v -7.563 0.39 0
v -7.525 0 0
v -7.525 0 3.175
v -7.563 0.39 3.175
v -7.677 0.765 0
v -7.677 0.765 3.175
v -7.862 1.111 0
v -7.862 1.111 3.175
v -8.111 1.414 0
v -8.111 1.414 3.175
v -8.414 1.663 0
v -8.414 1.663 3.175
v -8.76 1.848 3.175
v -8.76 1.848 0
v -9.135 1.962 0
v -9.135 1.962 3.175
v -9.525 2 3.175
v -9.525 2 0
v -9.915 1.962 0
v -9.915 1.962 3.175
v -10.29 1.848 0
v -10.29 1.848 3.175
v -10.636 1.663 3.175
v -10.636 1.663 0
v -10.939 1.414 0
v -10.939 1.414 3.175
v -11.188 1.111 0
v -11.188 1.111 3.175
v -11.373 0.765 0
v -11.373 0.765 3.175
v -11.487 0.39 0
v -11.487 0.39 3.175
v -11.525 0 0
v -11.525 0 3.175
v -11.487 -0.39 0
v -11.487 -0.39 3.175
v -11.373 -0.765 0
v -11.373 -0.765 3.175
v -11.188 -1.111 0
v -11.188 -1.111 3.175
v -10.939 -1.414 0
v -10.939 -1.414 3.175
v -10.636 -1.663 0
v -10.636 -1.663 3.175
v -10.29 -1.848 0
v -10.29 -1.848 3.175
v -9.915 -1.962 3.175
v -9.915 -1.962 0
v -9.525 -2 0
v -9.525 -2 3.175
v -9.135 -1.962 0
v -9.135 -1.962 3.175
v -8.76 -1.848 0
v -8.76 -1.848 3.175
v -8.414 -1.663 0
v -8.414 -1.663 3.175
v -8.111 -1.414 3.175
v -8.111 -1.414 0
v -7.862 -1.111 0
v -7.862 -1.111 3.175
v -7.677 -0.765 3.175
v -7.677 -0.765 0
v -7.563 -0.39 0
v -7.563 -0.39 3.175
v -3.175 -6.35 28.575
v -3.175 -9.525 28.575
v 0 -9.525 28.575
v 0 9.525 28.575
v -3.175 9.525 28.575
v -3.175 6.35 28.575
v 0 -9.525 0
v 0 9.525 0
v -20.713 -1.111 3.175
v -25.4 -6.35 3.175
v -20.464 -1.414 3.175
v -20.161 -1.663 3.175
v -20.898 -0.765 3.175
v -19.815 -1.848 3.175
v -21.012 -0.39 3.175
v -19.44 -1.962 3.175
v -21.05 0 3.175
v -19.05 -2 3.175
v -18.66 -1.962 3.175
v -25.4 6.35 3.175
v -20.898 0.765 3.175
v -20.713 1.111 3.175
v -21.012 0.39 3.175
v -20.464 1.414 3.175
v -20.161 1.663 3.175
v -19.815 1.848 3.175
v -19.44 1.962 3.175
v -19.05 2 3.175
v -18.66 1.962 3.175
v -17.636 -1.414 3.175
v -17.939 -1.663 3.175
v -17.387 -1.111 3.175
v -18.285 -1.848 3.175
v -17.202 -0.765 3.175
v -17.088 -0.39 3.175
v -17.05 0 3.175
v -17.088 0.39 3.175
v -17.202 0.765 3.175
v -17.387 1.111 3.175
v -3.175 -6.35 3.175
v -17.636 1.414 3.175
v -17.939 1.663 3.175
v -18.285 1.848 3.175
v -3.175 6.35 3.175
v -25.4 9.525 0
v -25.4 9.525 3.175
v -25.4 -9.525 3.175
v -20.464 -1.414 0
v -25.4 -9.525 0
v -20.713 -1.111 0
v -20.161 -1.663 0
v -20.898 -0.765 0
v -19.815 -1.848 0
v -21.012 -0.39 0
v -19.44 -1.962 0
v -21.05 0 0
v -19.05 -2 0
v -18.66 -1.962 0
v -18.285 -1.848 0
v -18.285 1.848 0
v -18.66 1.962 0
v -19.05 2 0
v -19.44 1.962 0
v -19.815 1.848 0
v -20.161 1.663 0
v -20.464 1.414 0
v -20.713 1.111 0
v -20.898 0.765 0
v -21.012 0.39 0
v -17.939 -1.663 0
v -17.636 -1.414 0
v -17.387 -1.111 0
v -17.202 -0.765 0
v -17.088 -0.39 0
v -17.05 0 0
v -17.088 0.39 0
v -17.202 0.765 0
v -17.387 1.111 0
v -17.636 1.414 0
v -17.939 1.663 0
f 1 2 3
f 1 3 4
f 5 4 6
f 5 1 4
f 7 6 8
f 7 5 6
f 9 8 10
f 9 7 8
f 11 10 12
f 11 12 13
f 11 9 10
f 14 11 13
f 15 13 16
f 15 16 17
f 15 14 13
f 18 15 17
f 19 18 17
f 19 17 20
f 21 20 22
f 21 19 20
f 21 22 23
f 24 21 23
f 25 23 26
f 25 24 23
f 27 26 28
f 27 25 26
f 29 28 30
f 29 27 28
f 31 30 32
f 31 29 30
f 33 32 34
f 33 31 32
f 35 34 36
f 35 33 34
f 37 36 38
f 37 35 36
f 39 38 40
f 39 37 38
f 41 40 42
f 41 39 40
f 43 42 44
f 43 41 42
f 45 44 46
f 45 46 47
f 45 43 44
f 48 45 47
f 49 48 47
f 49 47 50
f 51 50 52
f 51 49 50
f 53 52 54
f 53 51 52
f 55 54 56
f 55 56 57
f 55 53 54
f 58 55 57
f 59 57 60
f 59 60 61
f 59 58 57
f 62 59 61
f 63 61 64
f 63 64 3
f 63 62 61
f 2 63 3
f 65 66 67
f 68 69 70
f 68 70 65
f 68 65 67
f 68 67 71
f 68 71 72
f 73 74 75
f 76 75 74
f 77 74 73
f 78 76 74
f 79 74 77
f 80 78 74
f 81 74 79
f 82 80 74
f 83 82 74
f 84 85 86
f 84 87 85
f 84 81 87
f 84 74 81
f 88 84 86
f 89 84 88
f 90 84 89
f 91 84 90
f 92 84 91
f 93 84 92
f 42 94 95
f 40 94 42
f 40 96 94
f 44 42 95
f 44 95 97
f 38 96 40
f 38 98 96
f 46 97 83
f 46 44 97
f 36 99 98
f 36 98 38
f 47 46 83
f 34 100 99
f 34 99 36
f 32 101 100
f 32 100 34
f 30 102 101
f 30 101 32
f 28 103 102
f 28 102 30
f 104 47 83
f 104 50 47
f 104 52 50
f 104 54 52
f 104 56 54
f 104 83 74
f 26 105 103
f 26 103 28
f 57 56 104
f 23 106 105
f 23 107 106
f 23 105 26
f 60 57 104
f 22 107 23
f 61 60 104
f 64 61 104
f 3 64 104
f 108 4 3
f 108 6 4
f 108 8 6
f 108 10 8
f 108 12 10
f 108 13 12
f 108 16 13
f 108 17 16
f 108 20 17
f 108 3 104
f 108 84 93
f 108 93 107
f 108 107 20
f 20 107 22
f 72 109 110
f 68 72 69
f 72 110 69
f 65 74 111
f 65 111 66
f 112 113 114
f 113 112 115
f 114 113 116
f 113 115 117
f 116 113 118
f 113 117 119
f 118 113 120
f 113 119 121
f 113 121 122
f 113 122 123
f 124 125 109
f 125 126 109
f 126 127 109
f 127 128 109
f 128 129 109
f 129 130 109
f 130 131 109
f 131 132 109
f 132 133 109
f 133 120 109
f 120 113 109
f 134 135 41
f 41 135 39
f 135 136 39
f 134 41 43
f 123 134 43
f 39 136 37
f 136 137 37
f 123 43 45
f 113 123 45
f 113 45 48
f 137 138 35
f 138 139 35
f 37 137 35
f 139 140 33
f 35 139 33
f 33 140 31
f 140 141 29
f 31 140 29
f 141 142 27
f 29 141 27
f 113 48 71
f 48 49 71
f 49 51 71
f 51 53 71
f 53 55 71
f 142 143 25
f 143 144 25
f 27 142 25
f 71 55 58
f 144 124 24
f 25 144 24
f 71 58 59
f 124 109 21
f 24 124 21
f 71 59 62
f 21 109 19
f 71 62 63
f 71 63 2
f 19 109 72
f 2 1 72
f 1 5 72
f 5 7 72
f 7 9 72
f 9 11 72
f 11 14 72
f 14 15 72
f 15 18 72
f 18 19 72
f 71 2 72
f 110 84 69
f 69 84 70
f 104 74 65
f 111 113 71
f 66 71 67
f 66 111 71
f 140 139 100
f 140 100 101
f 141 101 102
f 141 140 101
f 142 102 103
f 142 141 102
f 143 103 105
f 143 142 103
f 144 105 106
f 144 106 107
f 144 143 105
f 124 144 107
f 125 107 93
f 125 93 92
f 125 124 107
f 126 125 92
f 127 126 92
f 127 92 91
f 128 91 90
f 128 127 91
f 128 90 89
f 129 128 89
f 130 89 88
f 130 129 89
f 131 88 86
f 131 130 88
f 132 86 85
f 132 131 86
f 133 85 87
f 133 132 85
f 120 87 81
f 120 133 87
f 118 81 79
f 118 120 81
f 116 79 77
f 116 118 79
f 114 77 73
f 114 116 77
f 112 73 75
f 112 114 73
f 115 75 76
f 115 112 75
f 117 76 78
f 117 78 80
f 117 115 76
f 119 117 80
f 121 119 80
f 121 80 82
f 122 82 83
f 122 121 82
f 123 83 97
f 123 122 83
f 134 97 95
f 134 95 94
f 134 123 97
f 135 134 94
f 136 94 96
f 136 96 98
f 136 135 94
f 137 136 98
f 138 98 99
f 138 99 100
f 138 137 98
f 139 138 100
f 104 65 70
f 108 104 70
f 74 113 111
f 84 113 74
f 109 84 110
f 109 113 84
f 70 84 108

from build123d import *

# Parameters (mm, degrees)
SKETCH1_W           = 25.4
SKETCH1_H           = 19.05
SKETCH1_R           = 2
BOSS_EXTRUDE1_DEPTH = 3.175
SKETCH2_W           = 3.175
SKETCH2_H           = 19.05
BOSS_EXTRUDE2_DEPTH = 25.4
RIB1_REACH          = 44.715
SKETCH3_WALL_W      = 121.181225654
SKETCH3_WALL_H      = 3.175


with BuildPart() as part:
    # Sketch1 → Boss-Extrude1 (new body)
    with BuildSketch(Plane.XY):
        with Locations((-12.7, 0)):
            Rectangle(SKETCH1_W, SKETCH1_H)
        with Locations((-9.525, 0)):
            Circle(SKETCH1_R, mode=Mode.SUBTRACT)
        with Locations((-19.05, 0)):
            Circle(SKETCH1_R, mode=Mode.SUBTRACT)
    extrude(amount=BOSS_EXTRUDE1_DEPTH)

    # Sketch2 → Boss-Extrude2 (add)
    with BuildSketch(Plane.XY.offset(3.175)):
        with Locations((-1.5875, 0)):
            Rectangle(SKETCH2_W, SKETCH2_H)
    extrude(amount=BOSS_EXTRUDE2_DEPTH)

    # Sketch3 wall → Rib1 (add, up to next)
    with BuildSketch(Plane(origin=(-14.2875, 9.525, 15.875), x_dir=(0.658504607869, 0, 0.752576694707), z_dir=(0.752576694707, 0, -0.658504607869)), mode=Mode.PRIVATE) as rib1_sk1:
        with Locations((0, 1.5875)):
            Rectangle(SKETCH3_WALL_W, SKETCH3_WALL_H)
    rib1_tool1 = extrude(rib1_sk1.sketch, amount=RIB1_REACH, mode=Mode.PRIVATE) - part.part
    rib1 = rib1_tool1.solids().sort_by_distance((-14.2875, 9.525, 15.875))[0]
    add(rib1)

    # Mirror1: Rib1 across plane
    add(rib1.mirror(Plane.ZX))


solid = part.part
